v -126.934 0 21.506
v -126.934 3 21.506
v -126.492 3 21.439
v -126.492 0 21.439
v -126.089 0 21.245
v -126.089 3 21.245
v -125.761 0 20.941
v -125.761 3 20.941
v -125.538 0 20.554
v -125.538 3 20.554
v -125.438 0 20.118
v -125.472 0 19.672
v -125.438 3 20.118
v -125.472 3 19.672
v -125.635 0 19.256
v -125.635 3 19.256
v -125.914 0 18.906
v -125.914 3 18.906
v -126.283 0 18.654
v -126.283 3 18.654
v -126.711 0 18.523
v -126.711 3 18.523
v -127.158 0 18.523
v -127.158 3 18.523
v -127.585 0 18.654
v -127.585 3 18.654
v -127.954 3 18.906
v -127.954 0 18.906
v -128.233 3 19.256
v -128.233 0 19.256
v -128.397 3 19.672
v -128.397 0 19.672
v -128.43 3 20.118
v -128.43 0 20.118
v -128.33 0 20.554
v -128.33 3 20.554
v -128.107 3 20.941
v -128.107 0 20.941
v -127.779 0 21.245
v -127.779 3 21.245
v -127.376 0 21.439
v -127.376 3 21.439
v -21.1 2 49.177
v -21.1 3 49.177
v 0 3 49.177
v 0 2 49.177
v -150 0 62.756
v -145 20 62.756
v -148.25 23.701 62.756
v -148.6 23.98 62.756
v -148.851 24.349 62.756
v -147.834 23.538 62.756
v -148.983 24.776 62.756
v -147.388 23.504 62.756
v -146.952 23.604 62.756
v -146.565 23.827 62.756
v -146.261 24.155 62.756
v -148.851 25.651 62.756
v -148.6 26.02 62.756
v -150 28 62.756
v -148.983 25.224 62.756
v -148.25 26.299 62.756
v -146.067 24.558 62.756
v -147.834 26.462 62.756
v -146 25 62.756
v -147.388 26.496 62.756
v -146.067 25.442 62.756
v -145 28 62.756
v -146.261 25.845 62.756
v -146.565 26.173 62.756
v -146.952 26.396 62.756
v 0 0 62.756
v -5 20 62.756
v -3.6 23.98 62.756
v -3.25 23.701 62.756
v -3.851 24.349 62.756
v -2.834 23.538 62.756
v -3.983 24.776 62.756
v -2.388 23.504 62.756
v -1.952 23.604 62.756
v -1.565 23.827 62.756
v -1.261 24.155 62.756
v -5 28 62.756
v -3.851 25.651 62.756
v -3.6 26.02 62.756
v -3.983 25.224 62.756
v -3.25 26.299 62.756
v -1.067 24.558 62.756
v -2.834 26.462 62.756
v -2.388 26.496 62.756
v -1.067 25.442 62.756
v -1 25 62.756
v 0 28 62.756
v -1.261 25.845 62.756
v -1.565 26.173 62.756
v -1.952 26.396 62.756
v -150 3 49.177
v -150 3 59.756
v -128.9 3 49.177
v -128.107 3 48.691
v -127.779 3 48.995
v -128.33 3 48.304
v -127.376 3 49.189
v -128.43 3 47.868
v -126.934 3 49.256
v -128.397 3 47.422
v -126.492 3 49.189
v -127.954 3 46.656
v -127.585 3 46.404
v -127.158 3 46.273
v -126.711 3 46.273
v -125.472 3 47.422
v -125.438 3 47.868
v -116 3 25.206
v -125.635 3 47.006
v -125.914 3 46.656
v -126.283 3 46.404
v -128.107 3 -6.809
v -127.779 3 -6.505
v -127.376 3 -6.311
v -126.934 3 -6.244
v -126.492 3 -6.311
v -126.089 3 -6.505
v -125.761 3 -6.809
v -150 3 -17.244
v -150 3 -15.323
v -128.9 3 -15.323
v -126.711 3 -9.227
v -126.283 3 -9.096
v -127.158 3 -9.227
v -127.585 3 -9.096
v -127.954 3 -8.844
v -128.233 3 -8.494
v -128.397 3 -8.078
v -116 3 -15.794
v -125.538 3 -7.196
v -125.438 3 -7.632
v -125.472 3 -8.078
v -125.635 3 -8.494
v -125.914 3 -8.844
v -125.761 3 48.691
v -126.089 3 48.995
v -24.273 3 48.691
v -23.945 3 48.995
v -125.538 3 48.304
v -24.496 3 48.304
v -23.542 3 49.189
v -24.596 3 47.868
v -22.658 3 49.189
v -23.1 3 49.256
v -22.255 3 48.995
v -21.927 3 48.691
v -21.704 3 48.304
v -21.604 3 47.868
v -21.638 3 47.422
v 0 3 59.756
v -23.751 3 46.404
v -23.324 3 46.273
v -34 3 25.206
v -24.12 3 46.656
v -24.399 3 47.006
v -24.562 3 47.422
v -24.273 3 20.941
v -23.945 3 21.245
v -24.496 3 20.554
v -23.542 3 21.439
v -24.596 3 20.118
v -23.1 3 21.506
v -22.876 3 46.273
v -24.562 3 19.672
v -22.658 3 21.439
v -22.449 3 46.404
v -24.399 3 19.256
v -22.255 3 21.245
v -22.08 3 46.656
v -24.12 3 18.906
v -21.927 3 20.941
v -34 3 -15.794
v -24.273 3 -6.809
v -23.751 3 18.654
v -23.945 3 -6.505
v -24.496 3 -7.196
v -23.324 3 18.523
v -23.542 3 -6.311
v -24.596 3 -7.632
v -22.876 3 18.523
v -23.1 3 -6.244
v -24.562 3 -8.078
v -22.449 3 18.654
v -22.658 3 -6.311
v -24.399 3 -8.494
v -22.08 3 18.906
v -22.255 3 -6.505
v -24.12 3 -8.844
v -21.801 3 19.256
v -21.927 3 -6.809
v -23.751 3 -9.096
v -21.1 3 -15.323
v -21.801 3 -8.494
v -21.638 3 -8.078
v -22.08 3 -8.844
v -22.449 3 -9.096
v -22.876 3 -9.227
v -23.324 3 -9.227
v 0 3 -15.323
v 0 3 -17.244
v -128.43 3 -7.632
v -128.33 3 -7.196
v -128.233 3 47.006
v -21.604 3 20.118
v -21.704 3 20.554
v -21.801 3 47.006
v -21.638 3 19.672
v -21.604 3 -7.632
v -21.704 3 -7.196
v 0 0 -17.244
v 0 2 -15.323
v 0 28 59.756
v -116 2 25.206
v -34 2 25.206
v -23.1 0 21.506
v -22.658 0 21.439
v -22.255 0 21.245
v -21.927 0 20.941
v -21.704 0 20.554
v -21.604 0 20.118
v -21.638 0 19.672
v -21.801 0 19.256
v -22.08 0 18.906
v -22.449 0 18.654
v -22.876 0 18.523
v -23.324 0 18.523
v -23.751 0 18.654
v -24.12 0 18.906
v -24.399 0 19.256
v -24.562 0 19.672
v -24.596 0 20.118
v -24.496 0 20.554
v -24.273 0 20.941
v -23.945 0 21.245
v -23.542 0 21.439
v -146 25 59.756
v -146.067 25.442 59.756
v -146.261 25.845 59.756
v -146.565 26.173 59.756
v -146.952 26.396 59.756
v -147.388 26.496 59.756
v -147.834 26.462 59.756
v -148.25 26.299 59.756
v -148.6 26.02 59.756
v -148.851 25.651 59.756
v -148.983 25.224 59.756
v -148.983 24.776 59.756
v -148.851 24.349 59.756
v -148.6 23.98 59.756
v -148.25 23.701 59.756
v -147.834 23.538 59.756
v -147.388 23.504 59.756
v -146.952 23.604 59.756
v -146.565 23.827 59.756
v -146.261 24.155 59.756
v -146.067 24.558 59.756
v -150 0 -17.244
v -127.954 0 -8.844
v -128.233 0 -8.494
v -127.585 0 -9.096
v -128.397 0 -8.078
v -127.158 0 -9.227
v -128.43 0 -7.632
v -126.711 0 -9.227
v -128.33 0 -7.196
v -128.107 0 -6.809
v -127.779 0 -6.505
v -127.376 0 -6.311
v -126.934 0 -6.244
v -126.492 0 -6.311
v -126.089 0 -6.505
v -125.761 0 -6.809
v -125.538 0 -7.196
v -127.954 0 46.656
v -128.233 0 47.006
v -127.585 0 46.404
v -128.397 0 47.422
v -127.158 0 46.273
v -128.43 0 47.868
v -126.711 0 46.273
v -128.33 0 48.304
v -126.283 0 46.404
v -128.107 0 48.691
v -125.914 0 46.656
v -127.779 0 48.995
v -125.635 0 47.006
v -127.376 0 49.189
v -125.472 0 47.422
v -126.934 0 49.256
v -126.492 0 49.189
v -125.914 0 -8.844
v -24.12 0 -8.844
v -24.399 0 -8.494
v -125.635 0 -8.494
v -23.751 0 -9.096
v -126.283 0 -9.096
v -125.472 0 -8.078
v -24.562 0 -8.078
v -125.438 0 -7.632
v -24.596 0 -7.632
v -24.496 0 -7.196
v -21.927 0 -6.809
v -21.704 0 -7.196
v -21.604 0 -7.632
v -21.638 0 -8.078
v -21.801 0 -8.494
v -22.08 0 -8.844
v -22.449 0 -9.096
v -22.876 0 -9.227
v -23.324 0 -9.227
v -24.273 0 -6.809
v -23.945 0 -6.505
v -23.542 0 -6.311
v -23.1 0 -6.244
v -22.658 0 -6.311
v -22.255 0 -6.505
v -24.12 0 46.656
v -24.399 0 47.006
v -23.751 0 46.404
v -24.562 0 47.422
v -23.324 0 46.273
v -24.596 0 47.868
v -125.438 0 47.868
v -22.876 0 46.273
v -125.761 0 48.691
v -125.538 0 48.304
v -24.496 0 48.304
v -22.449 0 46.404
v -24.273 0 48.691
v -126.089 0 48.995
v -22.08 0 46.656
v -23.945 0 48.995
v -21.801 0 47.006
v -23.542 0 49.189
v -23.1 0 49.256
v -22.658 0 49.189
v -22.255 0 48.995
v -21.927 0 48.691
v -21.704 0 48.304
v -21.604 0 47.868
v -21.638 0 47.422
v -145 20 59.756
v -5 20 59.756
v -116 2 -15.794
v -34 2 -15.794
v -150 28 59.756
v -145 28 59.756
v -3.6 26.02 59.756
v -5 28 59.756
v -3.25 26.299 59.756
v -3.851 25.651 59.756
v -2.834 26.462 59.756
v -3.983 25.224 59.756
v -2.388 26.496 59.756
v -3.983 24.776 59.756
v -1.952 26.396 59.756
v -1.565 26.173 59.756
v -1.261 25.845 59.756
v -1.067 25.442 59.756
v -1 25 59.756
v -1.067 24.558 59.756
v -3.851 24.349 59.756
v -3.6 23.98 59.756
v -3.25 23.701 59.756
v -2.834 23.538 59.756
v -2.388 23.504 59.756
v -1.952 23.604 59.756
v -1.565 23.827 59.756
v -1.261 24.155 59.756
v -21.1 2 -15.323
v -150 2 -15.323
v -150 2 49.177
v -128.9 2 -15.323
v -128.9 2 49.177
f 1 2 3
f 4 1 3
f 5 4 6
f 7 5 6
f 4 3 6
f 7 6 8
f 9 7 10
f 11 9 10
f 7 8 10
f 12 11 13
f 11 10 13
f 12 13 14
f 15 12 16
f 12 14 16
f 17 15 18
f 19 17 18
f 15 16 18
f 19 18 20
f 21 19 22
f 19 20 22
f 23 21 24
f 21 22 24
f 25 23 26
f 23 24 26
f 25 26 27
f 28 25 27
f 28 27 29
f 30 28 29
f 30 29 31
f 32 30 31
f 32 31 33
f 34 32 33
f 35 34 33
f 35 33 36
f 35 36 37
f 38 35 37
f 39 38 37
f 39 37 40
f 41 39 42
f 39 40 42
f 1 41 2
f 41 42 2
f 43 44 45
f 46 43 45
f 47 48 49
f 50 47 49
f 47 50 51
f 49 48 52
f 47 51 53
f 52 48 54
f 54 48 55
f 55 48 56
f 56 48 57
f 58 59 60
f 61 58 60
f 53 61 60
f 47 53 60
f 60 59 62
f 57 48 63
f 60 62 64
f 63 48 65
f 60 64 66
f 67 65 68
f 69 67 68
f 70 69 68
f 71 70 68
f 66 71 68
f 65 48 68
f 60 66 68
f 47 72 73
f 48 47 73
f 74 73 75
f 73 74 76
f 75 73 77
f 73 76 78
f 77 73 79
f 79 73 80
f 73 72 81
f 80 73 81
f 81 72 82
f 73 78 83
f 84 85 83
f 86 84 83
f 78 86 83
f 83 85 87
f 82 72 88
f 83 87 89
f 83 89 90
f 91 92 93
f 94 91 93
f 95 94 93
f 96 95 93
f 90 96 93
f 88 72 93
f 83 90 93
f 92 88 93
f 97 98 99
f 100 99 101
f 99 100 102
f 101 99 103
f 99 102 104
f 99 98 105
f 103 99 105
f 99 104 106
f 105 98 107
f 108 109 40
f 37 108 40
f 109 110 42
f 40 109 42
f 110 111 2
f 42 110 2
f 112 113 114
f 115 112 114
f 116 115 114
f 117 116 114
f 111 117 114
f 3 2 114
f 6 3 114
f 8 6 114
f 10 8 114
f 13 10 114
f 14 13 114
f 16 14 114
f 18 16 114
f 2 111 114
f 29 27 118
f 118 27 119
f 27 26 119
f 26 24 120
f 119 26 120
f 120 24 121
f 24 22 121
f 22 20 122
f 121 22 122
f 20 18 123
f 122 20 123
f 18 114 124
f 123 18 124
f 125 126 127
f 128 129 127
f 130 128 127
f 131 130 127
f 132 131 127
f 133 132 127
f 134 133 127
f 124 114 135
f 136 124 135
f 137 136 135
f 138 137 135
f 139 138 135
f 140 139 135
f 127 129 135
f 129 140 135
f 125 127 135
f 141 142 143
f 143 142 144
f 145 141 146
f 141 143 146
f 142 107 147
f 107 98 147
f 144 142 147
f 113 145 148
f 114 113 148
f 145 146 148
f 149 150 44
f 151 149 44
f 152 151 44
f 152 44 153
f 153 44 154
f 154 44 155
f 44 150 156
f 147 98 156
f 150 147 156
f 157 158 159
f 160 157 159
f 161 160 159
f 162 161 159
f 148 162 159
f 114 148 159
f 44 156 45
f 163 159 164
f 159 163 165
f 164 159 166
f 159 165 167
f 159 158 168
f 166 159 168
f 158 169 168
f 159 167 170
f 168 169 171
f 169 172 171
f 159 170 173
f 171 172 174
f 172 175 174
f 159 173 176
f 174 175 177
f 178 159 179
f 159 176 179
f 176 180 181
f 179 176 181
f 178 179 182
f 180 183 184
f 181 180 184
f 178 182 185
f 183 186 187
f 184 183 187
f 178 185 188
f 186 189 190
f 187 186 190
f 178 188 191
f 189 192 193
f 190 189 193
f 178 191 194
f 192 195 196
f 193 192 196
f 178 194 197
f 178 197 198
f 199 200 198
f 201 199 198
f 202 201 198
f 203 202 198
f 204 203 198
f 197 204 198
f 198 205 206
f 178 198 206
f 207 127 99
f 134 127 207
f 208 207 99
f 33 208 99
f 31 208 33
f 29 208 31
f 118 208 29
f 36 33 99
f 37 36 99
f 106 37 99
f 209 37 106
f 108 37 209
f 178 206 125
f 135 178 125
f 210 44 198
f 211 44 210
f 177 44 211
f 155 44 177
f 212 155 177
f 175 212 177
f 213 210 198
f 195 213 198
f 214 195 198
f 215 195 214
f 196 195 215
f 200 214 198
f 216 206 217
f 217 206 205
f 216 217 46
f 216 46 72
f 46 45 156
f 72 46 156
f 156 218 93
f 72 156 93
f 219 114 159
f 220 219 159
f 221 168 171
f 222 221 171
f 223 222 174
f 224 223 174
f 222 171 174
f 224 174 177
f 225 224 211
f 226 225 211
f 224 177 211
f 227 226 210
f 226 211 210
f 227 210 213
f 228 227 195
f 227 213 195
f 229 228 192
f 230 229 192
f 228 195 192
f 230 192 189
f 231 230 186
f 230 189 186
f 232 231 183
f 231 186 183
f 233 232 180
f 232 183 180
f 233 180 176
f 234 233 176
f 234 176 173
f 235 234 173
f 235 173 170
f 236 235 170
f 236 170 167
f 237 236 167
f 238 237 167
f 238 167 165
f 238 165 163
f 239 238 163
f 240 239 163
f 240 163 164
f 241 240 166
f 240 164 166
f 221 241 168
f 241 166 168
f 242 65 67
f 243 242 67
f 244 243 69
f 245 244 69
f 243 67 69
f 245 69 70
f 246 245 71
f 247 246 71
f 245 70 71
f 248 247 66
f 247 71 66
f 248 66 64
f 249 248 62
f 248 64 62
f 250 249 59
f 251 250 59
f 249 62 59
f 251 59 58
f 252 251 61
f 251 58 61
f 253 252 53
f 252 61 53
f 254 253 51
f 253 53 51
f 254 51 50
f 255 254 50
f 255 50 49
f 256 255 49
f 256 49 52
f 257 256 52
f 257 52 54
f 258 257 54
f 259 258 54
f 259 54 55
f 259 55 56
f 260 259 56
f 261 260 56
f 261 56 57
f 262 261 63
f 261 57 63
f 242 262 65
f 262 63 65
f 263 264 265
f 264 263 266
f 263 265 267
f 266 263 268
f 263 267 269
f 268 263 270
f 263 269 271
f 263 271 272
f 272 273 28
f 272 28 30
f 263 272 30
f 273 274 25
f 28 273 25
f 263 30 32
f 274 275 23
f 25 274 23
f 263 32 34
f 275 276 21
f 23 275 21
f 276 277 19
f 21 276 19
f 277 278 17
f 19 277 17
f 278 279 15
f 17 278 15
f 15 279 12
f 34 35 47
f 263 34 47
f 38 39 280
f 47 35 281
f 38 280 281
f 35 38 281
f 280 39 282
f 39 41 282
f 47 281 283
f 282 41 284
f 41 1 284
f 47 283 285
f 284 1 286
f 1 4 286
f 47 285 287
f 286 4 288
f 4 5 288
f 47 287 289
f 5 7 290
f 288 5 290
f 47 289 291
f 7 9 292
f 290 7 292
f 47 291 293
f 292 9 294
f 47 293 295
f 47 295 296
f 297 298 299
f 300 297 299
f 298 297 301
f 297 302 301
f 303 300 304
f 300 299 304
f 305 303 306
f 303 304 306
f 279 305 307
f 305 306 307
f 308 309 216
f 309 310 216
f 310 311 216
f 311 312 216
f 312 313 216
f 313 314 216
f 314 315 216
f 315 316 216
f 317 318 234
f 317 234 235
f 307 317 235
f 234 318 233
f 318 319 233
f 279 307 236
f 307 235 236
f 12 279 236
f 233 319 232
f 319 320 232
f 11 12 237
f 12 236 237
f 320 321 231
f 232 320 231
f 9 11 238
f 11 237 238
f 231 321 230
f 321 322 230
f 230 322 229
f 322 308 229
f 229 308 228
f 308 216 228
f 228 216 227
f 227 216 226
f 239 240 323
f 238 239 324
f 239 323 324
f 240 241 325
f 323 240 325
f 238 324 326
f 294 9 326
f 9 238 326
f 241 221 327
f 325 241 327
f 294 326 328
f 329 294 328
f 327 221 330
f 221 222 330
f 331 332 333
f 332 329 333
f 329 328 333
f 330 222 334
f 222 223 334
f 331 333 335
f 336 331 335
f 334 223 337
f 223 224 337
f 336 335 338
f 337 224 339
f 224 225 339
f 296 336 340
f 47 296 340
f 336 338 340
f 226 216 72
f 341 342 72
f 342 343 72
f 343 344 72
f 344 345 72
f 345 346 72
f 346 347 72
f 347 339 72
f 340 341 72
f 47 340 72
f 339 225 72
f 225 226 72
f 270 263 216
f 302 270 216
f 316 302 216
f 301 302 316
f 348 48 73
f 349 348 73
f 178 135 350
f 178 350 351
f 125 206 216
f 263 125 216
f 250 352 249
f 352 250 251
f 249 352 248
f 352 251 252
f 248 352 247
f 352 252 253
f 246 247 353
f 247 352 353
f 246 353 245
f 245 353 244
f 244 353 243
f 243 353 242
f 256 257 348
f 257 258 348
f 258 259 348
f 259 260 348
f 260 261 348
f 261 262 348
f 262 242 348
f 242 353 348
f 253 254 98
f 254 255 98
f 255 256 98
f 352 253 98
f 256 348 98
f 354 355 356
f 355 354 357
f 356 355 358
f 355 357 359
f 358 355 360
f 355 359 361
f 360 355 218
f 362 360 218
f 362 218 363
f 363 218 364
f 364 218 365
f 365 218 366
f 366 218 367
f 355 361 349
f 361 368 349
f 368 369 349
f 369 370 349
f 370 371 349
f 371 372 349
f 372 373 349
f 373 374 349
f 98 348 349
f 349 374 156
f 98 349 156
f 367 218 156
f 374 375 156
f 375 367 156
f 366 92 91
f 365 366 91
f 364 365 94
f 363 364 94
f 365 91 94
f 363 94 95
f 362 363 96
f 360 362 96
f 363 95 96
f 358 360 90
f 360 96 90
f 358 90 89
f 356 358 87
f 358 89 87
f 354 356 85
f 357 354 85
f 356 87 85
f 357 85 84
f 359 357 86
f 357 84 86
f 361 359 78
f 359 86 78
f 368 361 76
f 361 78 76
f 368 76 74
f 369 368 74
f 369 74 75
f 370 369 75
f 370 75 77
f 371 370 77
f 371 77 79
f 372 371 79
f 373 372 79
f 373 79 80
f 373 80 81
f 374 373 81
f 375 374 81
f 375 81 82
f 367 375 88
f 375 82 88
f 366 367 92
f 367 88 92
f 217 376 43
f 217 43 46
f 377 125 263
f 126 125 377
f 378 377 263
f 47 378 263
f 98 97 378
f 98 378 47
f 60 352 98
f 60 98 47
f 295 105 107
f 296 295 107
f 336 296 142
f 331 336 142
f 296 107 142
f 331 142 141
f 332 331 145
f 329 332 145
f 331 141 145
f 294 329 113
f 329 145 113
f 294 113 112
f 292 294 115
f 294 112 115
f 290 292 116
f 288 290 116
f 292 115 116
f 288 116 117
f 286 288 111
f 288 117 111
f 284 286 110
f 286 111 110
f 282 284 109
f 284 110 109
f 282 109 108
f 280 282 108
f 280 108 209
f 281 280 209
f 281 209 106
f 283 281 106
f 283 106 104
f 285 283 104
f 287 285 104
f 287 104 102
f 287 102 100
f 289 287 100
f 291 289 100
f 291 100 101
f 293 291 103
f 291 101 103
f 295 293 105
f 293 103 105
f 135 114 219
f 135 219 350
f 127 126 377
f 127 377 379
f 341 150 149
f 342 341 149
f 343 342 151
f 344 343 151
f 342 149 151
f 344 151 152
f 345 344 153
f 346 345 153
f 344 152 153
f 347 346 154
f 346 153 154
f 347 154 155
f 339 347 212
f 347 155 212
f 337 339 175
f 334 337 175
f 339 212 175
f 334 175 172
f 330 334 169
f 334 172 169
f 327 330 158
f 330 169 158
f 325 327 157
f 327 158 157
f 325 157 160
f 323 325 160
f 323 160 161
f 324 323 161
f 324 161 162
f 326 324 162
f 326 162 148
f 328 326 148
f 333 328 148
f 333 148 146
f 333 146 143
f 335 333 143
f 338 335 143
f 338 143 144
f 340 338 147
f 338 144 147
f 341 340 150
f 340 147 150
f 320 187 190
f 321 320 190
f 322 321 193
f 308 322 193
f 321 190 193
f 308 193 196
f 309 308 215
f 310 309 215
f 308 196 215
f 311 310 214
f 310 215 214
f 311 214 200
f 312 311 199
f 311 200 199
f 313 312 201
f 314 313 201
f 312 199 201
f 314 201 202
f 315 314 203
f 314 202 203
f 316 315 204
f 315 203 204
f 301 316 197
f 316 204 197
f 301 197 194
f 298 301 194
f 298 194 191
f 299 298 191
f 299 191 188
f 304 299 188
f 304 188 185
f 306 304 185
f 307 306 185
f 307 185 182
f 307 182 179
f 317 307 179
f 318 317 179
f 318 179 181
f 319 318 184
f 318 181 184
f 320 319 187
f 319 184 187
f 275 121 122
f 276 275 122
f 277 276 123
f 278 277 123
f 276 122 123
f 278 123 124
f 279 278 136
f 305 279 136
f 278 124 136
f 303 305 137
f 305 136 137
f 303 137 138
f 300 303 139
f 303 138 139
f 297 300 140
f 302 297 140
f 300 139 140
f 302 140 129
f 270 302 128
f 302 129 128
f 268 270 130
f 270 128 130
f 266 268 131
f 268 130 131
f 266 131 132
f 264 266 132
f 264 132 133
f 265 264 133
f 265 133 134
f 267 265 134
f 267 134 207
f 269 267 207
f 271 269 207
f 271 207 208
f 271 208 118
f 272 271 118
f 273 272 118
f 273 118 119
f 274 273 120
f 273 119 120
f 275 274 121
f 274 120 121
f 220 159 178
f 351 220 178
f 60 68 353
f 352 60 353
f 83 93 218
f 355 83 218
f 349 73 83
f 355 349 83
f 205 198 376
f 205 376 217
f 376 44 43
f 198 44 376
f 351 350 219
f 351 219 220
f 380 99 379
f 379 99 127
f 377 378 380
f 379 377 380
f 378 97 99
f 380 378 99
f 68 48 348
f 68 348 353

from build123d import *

# Parameters (mm, degrees)
BOSS_EXTRUDE2_DEPTH = 150
SKETCH4_W           = 21.1
SKETCH4_H           = 64.5
CUT_EXTRUDE1_DEPTH  = 1
SKETCH5_W           = 82
SKETCH5_H           = 41
CUT_EXTRUDE2_DEPTH  = 1
SKETCH6_W           = 140
SKETCH6_H           = 8
CUT_EXTRUDE3_DEPTH  = 3
SKETCH7_R           = 1.5
CUT_EXTRUDE4_DEPTH  = 3
SKETCH8_R           = 1.5
CUT_EXTRUDE5_DEPTH  = 3


with BuildPart() as part:
    # Sketch1 → Boss-Extrude2 (new body)
    with BuildSketch(Plane(origin=(0, 0, 0), x_dir=(0, 0, -1), z_dir=(1, 0, 0))):
        Polygon((-62.755935242, 0), (-62.755935242, 28), (-59.755935242, 28), (-59.755935242, 3), (17.244064758, 3), (17.244064758, 0), align=None)
    extrude(amount=-BOSS_EXTRUDE2_DEPTH)

    # Sketch4 → Cut-Extrude1 (cut)
    with BuildSketch(Plane(origin=(0, 3, 0), x_dir=(1, 0, 0), z_dir=(0, 1, 0))):
        with Locations((-139.45, -16.927076403)):
            Rectangle(SKETCH4_W, SKETCH4_H)
        with Locations((-10.55, -16.927076403)):
            Rectangle(SKETCH4_W, SKETCH4_H)
    extrude(amount=-CUT_EXTRUDE1_DEPTH, mode=Mode.SUBTRACT)

    # Sketch5 → Cut-Extrude2 (cut)
    with BuildSketch(Plane(origin=(0, 3, 0), x_dir=(1, 0, 0), z_dir=(0, 1, 0))):
        with Locations((-75, -4.705935242)):
            Rectangle(SKETCH5_W, SKETCH5_H)
    extrude(amount=-CUT_EXTRUDE2_DEPTH, mode=Mode.SUBTRACT)

    # Sketch6 → Cut-Extrude3 (cut)
    with BuildSketch(Plane.XY.offset(62.755935242)):
        with Locations((-75, 24)):
            Rectangle(SKETCH6_W, SKETCH6_H)
    extrude(amount=-CUT_EXTRUDE3_DEPTH, mode=Mode.SUBTRACT)

    # Sketch7 → Cut-Extrude4 (cut)
    with BuildSketch(Plane.XY.offset(62.755935242)):
        with Locations((-2.5, 25)):
            Circle(SKETCH7_R)
        with Locations((-147.5, 25)):
            Circle(SKETCH7_R)
    extrude(amount=-CUT_EXTRUDE4_DEPTH, mode=Mode.SUBTRACT)

    # Sketch8 → Cut-Extrude5 (cut)
    with BuildSketch(Plane(origin=(0, 3, 0), x_dir=(1, 0, 0), z_dir=(0, 1, 0))):
        with Locations(Location((-23.1, -47.755935242, 0), (0, 0, 270))):
            Circle(SKETCH8_R)
        with Locations(Location((-23.1, -20.005935242, 0), (0, 0, 270))):
            Circle(SKETCH8_R)
        with Locations(Location((-23.1, 7.744064758, 0), (0, 0, 270))):
            Circle(SKETCH8_R)
        with Locations(Location((-126.934112686, -47.755935242, 0), (0, 0, 270))):
            Circle(SKETCH8_R)
        with Locations(Location((-126.934112686, -20.005935242, 0), (0, 0, 270))):
            Circle(SKETCH8_R)
        with Locations(Location((-126.934112686, 7.744064758, 0), (0, 0, 270))):
            Circle(SKETCH8_R)
    extrude(amount=-CUT_EXTRUDE5_DEPTH, mode=Mode.SUBTRACT)


solid = part.part
